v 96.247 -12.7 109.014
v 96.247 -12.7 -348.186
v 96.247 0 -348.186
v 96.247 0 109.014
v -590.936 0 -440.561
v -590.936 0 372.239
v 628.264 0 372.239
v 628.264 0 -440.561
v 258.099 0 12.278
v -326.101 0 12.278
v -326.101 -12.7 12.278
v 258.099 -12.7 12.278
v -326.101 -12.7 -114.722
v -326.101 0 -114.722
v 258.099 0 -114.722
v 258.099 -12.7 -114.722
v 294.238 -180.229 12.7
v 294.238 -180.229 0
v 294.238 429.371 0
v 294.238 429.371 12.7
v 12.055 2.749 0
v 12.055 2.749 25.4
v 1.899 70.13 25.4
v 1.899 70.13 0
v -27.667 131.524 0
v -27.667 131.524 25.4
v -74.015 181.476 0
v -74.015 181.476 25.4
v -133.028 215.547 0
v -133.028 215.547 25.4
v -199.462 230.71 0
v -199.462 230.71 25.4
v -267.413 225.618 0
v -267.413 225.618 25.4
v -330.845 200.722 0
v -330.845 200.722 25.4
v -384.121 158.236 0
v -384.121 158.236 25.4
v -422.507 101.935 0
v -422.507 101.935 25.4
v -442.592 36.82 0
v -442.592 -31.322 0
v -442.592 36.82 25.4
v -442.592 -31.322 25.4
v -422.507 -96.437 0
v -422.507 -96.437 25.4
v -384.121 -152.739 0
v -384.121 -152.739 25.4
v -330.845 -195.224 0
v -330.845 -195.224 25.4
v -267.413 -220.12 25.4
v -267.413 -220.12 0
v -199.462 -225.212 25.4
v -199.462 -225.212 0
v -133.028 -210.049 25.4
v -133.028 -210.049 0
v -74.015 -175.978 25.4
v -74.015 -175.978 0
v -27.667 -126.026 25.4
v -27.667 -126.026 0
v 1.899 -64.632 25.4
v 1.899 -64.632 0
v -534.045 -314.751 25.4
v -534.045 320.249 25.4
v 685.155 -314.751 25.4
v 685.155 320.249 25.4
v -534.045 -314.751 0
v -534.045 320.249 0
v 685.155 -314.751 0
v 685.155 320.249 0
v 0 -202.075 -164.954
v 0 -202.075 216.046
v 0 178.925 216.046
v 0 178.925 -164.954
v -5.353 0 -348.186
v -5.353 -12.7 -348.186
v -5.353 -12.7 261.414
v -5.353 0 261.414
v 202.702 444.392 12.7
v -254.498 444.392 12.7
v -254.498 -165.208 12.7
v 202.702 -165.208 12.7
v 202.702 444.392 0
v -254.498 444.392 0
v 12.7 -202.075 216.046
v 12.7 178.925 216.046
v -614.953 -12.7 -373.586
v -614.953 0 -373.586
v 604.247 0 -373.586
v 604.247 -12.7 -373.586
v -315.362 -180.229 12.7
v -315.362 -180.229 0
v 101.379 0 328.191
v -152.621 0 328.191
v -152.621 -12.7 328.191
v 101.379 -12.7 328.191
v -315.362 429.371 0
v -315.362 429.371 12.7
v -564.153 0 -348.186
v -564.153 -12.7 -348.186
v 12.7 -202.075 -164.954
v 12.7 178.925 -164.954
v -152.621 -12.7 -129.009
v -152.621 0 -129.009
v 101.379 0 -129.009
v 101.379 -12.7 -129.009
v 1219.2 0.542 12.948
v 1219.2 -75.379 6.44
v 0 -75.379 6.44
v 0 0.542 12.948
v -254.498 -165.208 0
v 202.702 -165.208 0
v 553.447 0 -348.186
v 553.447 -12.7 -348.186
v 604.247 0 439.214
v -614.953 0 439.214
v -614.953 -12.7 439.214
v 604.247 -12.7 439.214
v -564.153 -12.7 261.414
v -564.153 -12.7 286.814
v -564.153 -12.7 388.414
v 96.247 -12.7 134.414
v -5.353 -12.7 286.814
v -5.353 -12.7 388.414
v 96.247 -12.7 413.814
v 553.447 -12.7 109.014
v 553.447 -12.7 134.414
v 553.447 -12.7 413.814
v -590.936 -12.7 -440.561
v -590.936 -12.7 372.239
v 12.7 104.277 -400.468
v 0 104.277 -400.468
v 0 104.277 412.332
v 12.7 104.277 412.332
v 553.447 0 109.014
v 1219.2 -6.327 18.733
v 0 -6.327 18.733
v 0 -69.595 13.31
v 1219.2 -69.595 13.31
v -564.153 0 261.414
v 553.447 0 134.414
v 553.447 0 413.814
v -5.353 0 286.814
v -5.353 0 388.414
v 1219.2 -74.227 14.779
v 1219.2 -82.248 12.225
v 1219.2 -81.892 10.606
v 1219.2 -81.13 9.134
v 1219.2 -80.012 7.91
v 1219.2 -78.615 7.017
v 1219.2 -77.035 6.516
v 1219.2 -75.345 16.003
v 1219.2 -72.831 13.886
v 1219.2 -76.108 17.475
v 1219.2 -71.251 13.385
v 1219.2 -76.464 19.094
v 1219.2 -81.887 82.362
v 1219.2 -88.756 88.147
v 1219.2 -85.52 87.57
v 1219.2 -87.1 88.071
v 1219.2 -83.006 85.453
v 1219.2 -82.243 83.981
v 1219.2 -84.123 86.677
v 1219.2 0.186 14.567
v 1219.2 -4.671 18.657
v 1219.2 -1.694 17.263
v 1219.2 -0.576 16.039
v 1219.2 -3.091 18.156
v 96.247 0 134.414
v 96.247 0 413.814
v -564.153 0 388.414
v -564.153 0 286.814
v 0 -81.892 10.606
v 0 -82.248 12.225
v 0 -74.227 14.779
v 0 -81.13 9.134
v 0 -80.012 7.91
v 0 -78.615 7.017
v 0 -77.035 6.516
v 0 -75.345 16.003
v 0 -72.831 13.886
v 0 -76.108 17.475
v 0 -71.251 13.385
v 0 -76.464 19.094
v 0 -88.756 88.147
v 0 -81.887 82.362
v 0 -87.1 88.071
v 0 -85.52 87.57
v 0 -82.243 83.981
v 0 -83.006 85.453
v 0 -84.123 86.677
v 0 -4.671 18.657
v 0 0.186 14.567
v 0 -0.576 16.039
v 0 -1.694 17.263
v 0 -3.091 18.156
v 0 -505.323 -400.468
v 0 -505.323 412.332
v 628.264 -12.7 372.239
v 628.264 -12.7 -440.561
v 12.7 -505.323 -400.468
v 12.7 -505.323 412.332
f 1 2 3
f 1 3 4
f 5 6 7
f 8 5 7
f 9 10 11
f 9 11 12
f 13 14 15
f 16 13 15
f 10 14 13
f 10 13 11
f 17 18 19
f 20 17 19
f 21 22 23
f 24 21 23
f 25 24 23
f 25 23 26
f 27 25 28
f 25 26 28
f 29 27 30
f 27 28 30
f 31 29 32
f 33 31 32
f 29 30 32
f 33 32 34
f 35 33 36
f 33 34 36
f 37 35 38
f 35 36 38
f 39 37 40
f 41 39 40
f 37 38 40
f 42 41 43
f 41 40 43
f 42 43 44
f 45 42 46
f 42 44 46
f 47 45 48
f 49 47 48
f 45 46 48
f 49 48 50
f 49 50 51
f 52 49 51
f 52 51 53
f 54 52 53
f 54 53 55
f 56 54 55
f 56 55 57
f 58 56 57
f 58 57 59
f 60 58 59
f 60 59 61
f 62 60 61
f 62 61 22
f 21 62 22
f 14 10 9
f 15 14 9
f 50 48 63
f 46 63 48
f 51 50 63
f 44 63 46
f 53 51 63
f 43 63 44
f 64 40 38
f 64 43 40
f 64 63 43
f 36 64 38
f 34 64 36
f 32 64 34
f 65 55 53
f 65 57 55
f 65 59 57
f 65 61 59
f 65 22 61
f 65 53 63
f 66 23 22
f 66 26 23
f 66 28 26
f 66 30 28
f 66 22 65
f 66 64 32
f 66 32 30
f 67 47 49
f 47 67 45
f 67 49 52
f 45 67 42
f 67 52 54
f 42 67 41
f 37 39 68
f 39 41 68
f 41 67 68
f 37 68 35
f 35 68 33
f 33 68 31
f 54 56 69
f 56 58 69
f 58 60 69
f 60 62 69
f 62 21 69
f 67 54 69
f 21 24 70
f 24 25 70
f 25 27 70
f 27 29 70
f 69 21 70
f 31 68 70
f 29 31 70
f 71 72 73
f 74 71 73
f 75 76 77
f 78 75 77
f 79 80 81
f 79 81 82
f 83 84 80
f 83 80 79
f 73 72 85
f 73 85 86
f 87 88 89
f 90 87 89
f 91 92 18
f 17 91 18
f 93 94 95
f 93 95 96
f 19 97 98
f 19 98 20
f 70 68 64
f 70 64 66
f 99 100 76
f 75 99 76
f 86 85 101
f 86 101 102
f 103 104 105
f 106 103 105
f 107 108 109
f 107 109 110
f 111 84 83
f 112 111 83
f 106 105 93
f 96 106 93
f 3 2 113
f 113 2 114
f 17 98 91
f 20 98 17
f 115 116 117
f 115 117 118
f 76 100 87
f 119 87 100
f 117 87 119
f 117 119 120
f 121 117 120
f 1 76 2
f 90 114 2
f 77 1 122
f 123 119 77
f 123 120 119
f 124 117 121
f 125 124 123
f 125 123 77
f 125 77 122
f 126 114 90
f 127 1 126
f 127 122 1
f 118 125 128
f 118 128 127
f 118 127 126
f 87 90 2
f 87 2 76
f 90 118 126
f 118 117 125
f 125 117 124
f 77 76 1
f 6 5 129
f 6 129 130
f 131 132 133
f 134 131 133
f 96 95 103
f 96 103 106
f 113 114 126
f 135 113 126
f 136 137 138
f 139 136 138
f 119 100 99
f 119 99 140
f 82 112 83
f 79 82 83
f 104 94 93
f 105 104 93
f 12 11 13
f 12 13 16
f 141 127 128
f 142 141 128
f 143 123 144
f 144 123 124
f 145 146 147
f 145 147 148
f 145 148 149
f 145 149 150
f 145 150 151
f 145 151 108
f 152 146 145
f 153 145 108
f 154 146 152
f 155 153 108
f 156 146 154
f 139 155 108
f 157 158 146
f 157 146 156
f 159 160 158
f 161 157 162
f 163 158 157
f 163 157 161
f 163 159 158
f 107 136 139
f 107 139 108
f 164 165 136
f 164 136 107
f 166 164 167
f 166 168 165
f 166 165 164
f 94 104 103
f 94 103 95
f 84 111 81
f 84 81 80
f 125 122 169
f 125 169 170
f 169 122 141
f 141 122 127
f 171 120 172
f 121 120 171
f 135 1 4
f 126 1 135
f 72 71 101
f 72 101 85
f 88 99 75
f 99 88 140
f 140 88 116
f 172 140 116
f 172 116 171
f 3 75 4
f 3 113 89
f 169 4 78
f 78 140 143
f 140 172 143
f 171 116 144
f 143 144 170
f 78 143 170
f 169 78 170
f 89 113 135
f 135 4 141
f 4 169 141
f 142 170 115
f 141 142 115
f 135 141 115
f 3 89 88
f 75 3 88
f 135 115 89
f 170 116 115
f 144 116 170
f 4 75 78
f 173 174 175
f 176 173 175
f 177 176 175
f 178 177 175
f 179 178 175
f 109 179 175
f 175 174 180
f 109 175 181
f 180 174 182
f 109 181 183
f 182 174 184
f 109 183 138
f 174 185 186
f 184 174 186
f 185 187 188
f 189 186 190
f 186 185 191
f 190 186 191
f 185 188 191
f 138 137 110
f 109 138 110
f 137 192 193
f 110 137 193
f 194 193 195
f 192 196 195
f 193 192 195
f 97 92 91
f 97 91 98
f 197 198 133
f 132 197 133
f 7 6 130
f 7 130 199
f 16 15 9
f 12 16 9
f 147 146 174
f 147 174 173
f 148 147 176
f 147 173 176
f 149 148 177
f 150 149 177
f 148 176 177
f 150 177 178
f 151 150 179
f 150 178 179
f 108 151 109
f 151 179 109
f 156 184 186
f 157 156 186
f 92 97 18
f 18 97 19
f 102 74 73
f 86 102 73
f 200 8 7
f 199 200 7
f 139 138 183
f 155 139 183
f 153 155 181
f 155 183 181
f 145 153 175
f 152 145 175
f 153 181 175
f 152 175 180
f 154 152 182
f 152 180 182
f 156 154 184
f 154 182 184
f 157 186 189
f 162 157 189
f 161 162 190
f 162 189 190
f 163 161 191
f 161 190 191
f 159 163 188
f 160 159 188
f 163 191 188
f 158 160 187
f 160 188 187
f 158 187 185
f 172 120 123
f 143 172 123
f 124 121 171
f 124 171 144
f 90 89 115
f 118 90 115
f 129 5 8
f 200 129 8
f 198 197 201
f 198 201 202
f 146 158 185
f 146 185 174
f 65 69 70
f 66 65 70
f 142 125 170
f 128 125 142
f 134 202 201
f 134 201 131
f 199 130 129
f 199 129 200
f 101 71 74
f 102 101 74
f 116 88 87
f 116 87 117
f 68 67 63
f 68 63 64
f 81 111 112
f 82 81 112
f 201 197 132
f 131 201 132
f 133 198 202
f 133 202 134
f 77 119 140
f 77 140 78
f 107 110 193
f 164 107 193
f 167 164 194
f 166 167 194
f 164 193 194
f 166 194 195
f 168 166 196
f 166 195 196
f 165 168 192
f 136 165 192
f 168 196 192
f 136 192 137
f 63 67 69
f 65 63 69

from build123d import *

# Parameters (mm, degrees)
F0_W      = 1219.2
F0_H      = 812.8
F1_DEPTH  = 12.7
F2_W      = 558.8
F2_H      = 609.6
F2_W_2    = 457.2
F2_H_2    = 457.2
F2_H_3    = 279.4
F2_H_4    = 101.6
F3_DEPTH  = 12.701
F4_W      = 609.6
F4_H      = 812.8
F5_DEPTH  = 12.7
F6_W      = 1219.2
F6_H      = 812.8
F7_DEPTH  = 12.7
F8_W      = 1219.2
F8_H      = 635
F9_DEPTH  = 25.4
F10_W     = 609.6
F10_H     = 609.6
F11_DEPTH = 12.7
F12_W     = 457.2
F12_H     = 609.6
F13_DEPTH = 12.7
F14_W     = 584.2
F14_H     = 127
F15_DEPTH = 12.7
F16_W     = 254
F16_H     = 457.2
F17_DEPTH = 12.7
F19_DEPTH = 1219.2
F20_W     = 381
F20_H     = 381
F21_DEPTH = 12.7
F22_R     = 228.6
F23_DEPTH = 465.9623922819


with BuildPart() as f1:
    # F0 (on Front) → F1 (new body)
    with BuildSketch(Plane.XZ):
        with Locations((-5.3532924503, 32.8135361745)):
            Rectangle(F0_W, F0_H)
    extrude(amount=F1_DEPTH)

    # F2 (on face) → F3 (cut, through all)
    with BuildSketch(Plane.XZ.offset(12.7)):
        with Locations((-284.7532924503, -43.3864638255)):
            Rectangle(F2_W, F2_H)
        with Locations((324.8467075497, -119.5864638255)):
            Rectangle(F2_W_2, F2_H_2)
        with Locations((324.8467075497, 274.1135361745)):
            Rectangle(F2_W_2, F2_H_3)
        with Locations((-284.7532924503, 337.6135361745)):
            Rectangle(F2_W, F2_H_4)
    extrude(amount=-F3_DEPTH, mode=Mode.SUBTRACT)


with BuildPart() as f5:
    # F4 (on Right) → F5 (new body)
    with BuildSketch(Plane.YZ):
        with Locations((-200.5230661683, 5.9320246801)):
            Rectangle(F4_W, F4_H)
    extrude(amount=F5_DEPTH)


with BuildPart() as f7:
    # F6 (on Front) → F7 (new body)
    with BuildSketch(Plane.XZ):
        with Locations((18.6641775072, -34.1613922819)):
            Rectangle(F6_W, F6_H)
    extrude(amount=F7_DEPTH)


with BuildPart() as f9:
    # F8 (on Top) → F9 (new body)
    with BuildSketch(Plane.XY):
        with Locations((75.5549373063, 2.7489876375)):
            Rectangle(F8_W, F8_H)
    extrude(amount=F9_DEPTH)

    # F22 (on face) → F23 (cut, through all)
    with BuildSketch(Plane.XY.offset(25.4)):
        with Locations((-216.5450626937, 2.7489876375)):
            Circle(F22_R)
    extrude(amount=-F23_DEPTH, mode=Mode.SUBTRACT)


with BuildPart() as f11:
    # F10 (on Top) → F11 (new body)
    with BuildSketch(Plane.XY):
        with Locations((-10.5619002134, 124.5714095004)):
            Rectangle(F10_W, F10_H)
    extrude(amount=F11_DEPTH)


with BuildPart() as f13:
    # F12 (on Top) → F13 (new body)
    with BuildSketch(Plane.XY):
        with Locations((-25.8983550593, 139.591619166)):
            Rectangle(F12_W, F12_H)
    extrude(amount=F13_DEPTH)


with BuildPart() as f15:
    # F14 (on Front) → F15 (new body)
    with BuildSketch(Plane.XZ):
        with Locations((-34.0006332844, -51.2215328759)):
            Rectangle(F14_W, F14_H)
    extrude(amount=F15_DEPTH)


with BuildPart() as f17:
    # F16 (on Front) → F17 (new body)
    with BuildSketch(Plane.XZ):
        with Locations((-25.6207156926, 99.5913136868)):
            Rectangle(F16_W, F16_H)
    extrude(amount=F17_DEPTH)


with BuildPart() as f19:
    # F18 (on Right) → F19 (new body)
    with BuildSketch(Plane.YZ):
        with BuildLine():
            Line((-76.4639118931, 19.0940284041), (-81.8868883565, 82.3620402764))
            ThreePointArc((-81.8868883565, 82.3620402764), (-84.1234278641, 86.6769289959), (-88.75598719, 88.1465438173))
            Line((-88.75598719, 88.1465438173), (-82.248415434, 12.2249295705))
            ThreePointArc((-82.248415434, 12.2249295705), (-80.0118759264, 7.910040851), (-75.3793166005, 6.4404260296))
            Line((-75.3793166005, 6.4404260296), (0.5422976463, 12.9479977856))
            ThreePointArc((0.5422976463, 12.9479977856), (-1.6942418613, 17.2628865051), (-6.3268011872, 18.7325013265))
            Line((-6.3268011872, 18.7325013265), (-69.5948130596, 13.3095248632))
            ThreePointArc((-69.5948130596, 13.3095248632), (-74.2273723855, 14.7791396845), (-76.4639118931, 19.0940284041))
        make_face()
    extrude(amount=F19_DEPTH)


with BuildPart() as f21:
    # F20 (on Right) → F21 (new body)
    with BuildSketch(Plane.YZ):
        with Locations((-11.5746818483, 25.5459176804)):
            Rectangle(F20_W, F20_H)
    extrude(amount=F21_DEPTH)


solid = Compound([f1.part, f5.part, f7.part, f9.part, f11.part, f13.part, f15.part, f17.part, f19.part, f21.part])
